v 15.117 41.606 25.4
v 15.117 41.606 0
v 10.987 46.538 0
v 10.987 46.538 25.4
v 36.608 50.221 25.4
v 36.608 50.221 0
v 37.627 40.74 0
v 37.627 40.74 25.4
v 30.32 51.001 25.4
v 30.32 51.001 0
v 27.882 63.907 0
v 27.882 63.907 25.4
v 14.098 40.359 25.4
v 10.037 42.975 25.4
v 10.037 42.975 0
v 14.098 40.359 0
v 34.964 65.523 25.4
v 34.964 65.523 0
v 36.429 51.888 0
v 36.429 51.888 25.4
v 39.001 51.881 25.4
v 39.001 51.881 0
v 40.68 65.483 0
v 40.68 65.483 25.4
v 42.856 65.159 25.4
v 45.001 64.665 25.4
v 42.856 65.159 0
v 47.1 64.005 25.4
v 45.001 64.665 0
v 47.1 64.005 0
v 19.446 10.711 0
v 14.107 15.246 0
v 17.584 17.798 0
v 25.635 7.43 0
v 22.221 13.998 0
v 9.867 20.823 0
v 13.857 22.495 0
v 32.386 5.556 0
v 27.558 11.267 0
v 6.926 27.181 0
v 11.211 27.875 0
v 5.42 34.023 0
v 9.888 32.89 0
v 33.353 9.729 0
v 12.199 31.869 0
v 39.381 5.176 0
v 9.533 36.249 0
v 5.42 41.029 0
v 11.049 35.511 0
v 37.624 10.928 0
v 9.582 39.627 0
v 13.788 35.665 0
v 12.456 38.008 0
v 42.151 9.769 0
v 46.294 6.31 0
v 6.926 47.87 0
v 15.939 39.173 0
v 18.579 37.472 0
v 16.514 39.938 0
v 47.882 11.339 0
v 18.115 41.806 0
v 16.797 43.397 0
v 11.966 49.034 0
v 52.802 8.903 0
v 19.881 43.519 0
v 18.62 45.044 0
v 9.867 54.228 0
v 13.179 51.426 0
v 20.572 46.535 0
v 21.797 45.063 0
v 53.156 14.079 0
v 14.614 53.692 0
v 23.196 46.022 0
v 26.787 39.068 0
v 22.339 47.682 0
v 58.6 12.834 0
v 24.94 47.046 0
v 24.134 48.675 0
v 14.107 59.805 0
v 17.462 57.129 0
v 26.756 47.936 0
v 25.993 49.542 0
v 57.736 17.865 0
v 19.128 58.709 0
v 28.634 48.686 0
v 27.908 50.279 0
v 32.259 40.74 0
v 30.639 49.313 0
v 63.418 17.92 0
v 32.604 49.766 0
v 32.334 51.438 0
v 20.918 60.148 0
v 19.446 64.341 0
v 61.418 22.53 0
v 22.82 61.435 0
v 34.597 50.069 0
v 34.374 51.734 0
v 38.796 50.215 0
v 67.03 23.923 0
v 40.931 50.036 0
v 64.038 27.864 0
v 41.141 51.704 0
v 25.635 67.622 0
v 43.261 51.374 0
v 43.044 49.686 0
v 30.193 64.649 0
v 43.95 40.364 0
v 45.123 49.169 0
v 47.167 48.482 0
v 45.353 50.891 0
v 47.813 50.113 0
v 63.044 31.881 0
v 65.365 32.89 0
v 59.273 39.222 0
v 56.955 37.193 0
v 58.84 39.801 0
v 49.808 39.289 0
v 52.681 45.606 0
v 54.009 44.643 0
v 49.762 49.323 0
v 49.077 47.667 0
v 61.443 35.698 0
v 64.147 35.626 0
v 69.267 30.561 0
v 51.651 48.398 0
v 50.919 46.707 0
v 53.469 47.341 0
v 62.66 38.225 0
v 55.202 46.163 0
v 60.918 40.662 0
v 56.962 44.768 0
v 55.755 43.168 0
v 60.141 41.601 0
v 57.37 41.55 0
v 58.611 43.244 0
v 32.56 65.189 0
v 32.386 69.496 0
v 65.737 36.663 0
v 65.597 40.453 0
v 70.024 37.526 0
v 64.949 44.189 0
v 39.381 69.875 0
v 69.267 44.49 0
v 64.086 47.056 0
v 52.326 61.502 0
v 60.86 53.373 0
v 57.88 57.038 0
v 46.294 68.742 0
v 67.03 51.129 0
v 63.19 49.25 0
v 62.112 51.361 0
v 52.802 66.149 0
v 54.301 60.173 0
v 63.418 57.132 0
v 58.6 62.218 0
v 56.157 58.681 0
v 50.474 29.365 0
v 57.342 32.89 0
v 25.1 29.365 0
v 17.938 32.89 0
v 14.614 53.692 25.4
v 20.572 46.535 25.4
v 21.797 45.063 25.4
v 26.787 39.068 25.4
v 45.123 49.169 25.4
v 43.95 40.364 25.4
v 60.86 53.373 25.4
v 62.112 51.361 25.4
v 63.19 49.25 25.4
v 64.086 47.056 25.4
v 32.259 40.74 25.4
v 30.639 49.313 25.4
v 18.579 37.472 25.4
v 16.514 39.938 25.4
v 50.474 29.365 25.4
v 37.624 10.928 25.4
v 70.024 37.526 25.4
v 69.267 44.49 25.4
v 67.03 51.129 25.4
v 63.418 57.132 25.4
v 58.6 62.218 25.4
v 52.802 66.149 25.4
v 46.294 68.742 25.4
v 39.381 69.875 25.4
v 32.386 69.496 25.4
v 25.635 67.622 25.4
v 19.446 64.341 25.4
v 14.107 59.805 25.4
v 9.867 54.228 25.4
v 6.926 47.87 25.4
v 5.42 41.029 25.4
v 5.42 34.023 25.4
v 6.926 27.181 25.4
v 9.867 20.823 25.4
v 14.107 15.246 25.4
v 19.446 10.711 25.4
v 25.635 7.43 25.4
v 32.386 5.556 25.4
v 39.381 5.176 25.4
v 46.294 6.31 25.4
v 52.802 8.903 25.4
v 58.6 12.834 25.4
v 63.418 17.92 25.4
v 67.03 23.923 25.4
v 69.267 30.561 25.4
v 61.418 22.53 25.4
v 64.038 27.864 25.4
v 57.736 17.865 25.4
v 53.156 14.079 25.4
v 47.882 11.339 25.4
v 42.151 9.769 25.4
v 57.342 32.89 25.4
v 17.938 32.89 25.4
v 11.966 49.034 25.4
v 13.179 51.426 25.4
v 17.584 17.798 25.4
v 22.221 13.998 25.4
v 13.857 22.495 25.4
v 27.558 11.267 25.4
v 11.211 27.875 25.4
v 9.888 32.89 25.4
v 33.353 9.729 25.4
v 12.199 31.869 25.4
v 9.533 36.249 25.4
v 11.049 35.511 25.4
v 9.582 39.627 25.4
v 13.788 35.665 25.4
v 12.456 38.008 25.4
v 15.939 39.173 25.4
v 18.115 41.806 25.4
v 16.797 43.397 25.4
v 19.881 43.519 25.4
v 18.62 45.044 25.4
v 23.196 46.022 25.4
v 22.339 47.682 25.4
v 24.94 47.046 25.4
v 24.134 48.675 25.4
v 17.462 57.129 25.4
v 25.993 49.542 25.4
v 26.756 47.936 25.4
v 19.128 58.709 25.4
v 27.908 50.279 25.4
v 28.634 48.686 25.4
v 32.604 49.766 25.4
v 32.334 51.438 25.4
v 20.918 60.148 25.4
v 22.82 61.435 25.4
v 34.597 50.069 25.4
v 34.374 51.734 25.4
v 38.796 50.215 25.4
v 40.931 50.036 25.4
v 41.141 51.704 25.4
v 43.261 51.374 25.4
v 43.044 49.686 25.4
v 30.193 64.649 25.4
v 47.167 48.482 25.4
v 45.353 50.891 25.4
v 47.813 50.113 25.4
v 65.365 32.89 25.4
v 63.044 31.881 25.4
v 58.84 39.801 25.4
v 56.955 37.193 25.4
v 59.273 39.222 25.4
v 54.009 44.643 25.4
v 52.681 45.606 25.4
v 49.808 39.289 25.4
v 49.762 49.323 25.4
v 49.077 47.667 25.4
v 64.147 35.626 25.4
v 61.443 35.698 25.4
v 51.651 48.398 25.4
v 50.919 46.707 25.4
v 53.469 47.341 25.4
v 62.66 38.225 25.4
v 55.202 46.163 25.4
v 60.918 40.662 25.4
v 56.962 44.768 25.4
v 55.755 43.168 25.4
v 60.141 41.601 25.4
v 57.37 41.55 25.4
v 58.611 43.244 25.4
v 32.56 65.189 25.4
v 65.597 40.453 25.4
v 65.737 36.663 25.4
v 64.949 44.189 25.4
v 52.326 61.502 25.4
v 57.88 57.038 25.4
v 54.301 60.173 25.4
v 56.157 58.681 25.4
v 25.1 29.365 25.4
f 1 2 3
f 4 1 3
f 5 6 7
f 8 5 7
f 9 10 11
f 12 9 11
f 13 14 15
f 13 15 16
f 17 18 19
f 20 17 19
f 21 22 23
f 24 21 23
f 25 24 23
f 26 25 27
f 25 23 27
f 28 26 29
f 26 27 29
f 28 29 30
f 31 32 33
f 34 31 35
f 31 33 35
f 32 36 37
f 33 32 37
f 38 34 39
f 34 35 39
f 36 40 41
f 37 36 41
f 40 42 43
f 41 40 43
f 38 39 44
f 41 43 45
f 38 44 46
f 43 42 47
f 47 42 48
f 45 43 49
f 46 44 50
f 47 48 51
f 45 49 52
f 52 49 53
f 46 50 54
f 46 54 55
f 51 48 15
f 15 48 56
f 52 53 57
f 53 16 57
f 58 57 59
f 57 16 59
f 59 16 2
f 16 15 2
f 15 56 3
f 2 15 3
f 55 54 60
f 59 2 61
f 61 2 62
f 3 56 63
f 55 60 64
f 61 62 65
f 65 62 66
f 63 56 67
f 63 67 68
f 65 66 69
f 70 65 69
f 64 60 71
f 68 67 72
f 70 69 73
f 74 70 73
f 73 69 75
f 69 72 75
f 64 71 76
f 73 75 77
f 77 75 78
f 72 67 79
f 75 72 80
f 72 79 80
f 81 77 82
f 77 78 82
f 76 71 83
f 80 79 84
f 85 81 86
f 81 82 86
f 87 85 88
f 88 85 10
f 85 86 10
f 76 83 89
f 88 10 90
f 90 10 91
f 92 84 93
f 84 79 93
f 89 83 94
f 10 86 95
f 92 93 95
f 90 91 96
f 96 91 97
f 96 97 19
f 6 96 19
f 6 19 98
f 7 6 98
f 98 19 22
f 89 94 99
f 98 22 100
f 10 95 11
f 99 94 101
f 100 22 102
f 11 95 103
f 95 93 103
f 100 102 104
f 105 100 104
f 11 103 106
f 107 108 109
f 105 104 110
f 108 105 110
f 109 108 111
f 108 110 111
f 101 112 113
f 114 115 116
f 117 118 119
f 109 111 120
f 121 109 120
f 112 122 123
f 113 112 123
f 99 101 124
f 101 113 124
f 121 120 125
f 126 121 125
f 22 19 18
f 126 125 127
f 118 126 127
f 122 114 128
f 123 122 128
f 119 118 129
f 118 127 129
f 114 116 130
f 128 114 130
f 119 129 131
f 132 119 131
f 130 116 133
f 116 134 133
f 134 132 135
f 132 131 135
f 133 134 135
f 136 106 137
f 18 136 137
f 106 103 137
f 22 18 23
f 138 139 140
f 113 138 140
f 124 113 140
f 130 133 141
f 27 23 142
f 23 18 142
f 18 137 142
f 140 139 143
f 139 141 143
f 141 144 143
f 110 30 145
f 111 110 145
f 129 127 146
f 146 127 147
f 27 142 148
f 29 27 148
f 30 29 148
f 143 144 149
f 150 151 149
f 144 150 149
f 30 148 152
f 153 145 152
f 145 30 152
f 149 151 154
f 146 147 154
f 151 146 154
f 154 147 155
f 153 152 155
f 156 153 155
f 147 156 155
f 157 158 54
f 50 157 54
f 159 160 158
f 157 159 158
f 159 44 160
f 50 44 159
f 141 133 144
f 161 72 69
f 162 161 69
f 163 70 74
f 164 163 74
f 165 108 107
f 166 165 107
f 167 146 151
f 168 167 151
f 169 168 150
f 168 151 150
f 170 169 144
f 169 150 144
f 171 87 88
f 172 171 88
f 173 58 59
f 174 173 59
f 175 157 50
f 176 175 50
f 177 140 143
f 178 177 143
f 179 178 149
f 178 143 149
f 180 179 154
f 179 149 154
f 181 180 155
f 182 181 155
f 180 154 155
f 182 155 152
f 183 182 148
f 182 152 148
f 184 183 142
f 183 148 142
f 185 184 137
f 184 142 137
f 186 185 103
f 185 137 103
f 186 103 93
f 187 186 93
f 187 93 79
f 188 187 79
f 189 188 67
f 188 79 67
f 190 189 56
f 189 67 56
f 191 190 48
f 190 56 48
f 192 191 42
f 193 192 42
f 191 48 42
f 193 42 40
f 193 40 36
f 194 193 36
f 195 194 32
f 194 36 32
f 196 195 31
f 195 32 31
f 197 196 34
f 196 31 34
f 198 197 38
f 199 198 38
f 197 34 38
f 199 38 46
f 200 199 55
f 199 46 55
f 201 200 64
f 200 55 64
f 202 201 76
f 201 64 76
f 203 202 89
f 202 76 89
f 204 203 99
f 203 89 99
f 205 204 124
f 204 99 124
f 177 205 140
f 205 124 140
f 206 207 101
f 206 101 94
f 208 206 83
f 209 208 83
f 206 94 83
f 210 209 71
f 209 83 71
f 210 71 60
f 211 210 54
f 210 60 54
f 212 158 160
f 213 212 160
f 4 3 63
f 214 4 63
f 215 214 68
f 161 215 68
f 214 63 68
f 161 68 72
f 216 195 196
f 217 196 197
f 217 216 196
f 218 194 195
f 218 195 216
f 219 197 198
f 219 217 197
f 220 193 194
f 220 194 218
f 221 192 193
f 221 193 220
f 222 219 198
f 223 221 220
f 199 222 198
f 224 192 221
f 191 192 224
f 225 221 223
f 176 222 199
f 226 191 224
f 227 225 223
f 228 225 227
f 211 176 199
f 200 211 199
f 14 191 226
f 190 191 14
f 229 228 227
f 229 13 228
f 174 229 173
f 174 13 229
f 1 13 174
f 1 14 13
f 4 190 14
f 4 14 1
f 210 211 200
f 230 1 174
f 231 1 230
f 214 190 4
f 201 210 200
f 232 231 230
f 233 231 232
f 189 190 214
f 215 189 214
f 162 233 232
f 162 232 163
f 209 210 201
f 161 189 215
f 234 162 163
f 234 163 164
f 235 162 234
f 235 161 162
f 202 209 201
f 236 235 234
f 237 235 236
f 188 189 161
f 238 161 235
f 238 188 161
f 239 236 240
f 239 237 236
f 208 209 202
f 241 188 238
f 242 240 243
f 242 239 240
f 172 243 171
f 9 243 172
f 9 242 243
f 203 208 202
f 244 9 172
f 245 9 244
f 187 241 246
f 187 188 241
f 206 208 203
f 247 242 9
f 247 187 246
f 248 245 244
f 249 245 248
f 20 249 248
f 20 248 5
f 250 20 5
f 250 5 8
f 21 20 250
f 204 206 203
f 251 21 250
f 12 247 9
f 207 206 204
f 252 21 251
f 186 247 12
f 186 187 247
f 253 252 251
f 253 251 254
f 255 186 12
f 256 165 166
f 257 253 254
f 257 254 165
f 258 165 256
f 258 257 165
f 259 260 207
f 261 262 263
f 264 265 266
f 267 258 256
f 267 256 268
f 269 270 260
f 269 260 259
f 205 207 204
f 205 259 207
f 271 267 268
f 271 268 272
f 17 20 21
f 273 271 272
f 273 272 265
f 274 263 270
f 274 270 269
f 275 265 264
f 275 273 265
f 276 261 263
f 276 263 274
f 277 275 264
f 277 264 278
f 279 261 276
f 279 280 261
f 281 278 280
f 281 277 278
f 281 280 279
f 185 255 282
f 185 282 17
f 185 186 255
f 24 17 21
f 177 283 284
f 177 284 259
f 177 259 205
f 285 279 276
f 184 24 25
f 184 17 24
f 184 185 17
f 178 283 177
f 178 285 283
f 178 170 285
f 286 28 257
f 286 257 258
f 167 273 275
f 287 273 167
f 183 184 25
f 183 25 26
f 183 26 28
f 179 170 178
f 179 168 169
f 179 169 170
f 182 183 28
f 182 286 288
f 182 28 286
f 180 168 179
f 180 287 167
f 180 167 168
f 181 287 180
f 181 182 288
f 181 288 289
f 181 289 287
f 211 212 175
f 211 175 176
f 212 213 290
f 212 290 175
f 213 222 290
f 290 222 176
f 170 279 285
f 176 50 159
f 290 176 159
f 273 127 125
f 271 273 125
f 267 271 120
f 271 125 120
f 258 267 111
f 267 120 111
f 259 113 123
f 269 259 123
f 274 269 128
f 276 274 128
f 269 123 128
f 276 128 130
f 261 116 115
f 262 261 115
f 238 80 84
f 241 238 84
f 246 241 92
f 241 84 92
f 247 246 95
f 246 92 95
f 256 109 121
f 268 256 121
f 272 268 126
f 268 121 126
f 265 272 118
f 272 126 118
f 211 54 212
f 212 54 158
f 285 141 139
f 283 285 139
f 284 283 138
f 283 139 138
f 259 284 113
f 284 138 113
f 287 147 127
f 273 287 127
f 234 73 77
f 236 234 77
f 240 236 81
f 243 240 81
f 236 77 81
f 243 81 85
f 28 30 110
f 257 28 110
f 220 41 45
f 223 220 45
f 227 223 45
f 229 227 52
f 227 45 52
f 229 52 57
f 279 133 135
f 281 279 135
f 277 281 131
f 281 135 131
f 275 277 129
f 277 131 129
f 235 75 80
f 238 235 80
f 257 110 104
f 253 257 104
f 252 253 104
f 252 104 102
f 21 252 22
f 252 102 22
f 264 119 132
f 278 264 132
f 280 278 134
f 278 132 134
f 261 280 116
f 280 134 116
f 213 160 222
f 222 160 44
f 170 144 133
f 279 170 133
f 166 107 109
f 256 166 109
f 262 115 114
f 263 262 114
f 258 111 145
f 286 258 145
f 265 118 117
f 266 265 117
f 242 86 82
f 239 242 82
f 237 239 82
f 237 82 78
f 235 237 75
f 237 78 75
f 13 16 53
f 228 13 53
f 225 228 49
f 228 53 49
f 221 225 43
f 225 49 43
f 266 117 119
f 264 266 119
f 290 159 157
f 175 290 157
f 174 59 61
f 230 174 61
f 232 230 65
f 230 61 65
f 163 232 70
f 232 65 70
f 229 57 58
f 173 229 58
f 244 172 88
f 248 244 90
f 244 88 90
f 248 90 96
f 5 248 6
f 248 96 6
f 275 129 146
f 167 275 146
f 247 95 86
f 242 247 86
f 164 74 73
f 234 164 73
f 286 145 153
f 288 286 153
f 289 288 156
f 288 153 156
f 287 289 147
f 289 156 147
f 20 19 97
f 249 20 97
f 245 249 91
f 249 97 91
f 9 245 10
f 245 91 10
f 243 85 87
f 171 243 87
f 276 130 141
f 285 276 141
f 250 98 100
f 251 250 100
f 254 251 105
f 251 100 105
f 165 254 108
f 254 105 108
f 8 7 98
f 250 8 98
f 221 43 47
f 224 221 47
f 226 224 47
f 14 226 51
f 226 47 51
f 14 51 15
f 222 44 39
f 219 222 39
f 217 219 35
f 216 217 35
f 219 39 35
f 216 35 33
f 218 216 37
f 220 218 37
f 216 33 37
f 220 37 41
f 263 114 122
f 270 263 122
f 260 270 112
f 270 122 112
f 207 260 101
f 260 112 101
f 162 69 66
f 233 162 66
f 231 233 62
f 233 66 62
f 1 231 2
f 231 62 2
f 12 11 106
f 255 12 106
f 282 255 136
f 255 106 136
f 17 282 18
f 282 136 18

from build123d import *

# Parameters (mm, degrees)
F0_R     = 32.397128
F1_DEPTH = 25.4


with BuildPart() as f1:
    # F0 (on Top) → F1 (new body)
    with BuildSketch(Plane.XY):
        with Locations((37.62687, 37.525859)):
            Circle(F0_R)
        with BuildLine():
            ThreePointArc((64.038143, 27.863669), (55.546064, 15.850626), (42.150506, 9.768879))
            Line((42.150506, 9.768879), (57.342436, 32.889675))
            Line((57.342436, 32.889675), (17.938334, 32.889675))
            Line((17.938334, 32.889675), (33.3534, 9.729264))
            ThreePointArc((33.3534, 9.729264), (19.800834, 15.773947), (11.211487, 27.874912))
            ThreePointArc((11.211487, 27.874912), (12.920461, 33.797806), (15.938562, 39.172963))
            Line((15.938562, 39.172963), (18.579211, 37.471808))
            Line((18.579211, 37.471808), (16.513879, 39.937897))
            ThreePointArc((16.513879, 39.937897), (18.978485, 42.682726), (21.79693, 45.062799))
            Line((21.79693, 45.062799), (26.786907, 39.067749))
            Line((26.786907, 39.067749), (23.196478, 46.021628))
            ThreePointArc((23.196478, 46.021628), (25.839836, 47.508267), (28.634337, 48.686485))
            Line((28.634337, 48.686485), (32.258701, 40.739689))
            Line((32.258701, 40.739689), (30.639012, 49.313462))
            ThreePointArc((30.639012, 49.313462), (33.597866, 49.936093), (36.608049, 50.221194))
            Line((36.608049, 50.221194), (37.62687, 40.739689))
            Line((37.62687, 40.739689), (38.795932, 50.214806))
            ThreePointArc((38.795932, 50.214806), (41.991078, 49.881953), (45.123374, 49.168886))
            Line((45.123374, 49.168886), (43.950234, 40.363967))
            Line((43.950234, 40.363967), (47.166887, 48.482341))
            ThreePointArc((47.166887, 48.482341), (50.007564, 47.205017), (52.680711, 45.60649))
            Line((52.680711, 45.60649), (49.80769, 39.289203))
            Line((49.80769, 39.289203), (54.008956, 44.642557))
            ThreePointArc((54.008956, 44.642557), (56.579737, 42.376606), (58.840087, 39.800898))
            Line((58.840087, 39.800898), (56.954861, 37.193418))
            Line((56.954861, 37.193418), (59.273398, 39.222249))
            ThreePointArc((59.273398, 39.222249), (62.317727, 33.820639), (64.038143, 27.863669))
        make_face(mode=Mode.SUBTRACT)
        Polygon((50.473832, 29.364996), (37.623877, 10.928214), (25.100218, 29.364996), align=None, mode=Mode.SUBTRACT)
        with BuildLine():
            ThreePointArc((9.888466, 32.889675), (9.506726, 37.939073), (10.036667, 42.975074))
            Line((10.036667, 42.975074), (14.097949, 40.358721))
            ThreePointArc((14.097949, 40.358721), (11.722598, 36.776711), (9.888466, 32.889675))
        make_face(mode=Mode.SUBTRACT)
        with BuildLine():
            Line((15.116865, 41.605987), (10.986651, 46.537627))
            ThreePointArc((10.986651, 46.537627), (12.544169, 50.244796), (14.614464, 53.691946))
            Line((14.614464, 53.691946), (20.571624, 46.534904))
            ThreePointArc((20.571624, 46.534904), (17.691328, 44.239676), (15.116865, 41.605987))
        make_face(mode=Mode.SUBTRACT)
        with BuildLine():
            Line((22.339414, 47.681575), (17.461614, 57.12881))
            ThreePointArc((17.461614, 57.12881), (20.008646, 59.446429), (22.819841, 61.435378))
            Line((22.819841, 61.435378), (27.907935, 50.279199))
            ThreePointArc((27.907935, 50.279199), (25.056396, 49.124611), (22.339414, 47.681575))
        make_face(mode=Mode.SUBTRACT)
        with BuildLine():
            Line((30.320273, 51.000694), (27.882156, 63.906795))
            ThreePointArc((27.882156, 63.906795), (31.370616, 64.944329), (34.963852, 65.522672))
            Line((34.963852, 65.522672), (36.42892, 51.88823))
            ThreePointArc((36.42892, 51.88823), (33.351504, 51.603405), (30.320273, 51.000694))
        make_face(mode=Mode.SUBTRACT)
        with BuildLine():
            ThreePointArc((64.949322, 44.188954), (65.731013, 38.560434), (65.365273, 32.889675))
            ThreePointArc((65.365273, 32.889675), (63.436107, 36.944067), (60.918471, 40.661766))
            Line((60.918471, 40.661766), (64.949322, 44.188954))
        make_face(mode=Mode.SUBTRACT)
        with BuildLine():
            ThreePointArc((60.860282, 53.372682), (62.672999, 50.316661), (64.08591, 47.056463))
            Line((64.08591, 47.056463), (60.141393, 41.600751))
            ThreePointArc((60.141393, 41.600751), (57.800984, 44.021736), (55.201862, 46.162587))
            Line((55.201862, 46.162587), (60.860282, 53.372682))
        make_face(mode=Mode.SUBTRACT)
        with BuildLine():
            Line((39.00146, 51.880582), (40.679739, 65.482847))
            ThreePointArc((40.679739, 65.482847), (43.933359, 64.932818), (47.100156, 64.005475))
            Line((47.100156, 64.005475), (45.35284, 50.891126))
            ThreePointArc((45.35284, 50.891126), (42.203966, 51.557985), (39.00146, 51.880582))
        make_face(mode=Mode.SUBTRACT)
        with BuildLine():
            ThreePointArc((52.325572, 61.502126), (55.244605, 59.446822), (57.879741, 57.038276))
            Line((57.879741, 57.038276), (53.469349, 47.340571))
            ThreePointArc((53.469349, 47.340571), (50.71484, 48.877102), (47.813072, 50.113221))
            Line((47.813072, 50.113221), (52.325572, 61.502126))
        make_face(mode=Mode.SUBTRACT)
    extrude(amount=F1_DEPTH)


solid = f1.part
